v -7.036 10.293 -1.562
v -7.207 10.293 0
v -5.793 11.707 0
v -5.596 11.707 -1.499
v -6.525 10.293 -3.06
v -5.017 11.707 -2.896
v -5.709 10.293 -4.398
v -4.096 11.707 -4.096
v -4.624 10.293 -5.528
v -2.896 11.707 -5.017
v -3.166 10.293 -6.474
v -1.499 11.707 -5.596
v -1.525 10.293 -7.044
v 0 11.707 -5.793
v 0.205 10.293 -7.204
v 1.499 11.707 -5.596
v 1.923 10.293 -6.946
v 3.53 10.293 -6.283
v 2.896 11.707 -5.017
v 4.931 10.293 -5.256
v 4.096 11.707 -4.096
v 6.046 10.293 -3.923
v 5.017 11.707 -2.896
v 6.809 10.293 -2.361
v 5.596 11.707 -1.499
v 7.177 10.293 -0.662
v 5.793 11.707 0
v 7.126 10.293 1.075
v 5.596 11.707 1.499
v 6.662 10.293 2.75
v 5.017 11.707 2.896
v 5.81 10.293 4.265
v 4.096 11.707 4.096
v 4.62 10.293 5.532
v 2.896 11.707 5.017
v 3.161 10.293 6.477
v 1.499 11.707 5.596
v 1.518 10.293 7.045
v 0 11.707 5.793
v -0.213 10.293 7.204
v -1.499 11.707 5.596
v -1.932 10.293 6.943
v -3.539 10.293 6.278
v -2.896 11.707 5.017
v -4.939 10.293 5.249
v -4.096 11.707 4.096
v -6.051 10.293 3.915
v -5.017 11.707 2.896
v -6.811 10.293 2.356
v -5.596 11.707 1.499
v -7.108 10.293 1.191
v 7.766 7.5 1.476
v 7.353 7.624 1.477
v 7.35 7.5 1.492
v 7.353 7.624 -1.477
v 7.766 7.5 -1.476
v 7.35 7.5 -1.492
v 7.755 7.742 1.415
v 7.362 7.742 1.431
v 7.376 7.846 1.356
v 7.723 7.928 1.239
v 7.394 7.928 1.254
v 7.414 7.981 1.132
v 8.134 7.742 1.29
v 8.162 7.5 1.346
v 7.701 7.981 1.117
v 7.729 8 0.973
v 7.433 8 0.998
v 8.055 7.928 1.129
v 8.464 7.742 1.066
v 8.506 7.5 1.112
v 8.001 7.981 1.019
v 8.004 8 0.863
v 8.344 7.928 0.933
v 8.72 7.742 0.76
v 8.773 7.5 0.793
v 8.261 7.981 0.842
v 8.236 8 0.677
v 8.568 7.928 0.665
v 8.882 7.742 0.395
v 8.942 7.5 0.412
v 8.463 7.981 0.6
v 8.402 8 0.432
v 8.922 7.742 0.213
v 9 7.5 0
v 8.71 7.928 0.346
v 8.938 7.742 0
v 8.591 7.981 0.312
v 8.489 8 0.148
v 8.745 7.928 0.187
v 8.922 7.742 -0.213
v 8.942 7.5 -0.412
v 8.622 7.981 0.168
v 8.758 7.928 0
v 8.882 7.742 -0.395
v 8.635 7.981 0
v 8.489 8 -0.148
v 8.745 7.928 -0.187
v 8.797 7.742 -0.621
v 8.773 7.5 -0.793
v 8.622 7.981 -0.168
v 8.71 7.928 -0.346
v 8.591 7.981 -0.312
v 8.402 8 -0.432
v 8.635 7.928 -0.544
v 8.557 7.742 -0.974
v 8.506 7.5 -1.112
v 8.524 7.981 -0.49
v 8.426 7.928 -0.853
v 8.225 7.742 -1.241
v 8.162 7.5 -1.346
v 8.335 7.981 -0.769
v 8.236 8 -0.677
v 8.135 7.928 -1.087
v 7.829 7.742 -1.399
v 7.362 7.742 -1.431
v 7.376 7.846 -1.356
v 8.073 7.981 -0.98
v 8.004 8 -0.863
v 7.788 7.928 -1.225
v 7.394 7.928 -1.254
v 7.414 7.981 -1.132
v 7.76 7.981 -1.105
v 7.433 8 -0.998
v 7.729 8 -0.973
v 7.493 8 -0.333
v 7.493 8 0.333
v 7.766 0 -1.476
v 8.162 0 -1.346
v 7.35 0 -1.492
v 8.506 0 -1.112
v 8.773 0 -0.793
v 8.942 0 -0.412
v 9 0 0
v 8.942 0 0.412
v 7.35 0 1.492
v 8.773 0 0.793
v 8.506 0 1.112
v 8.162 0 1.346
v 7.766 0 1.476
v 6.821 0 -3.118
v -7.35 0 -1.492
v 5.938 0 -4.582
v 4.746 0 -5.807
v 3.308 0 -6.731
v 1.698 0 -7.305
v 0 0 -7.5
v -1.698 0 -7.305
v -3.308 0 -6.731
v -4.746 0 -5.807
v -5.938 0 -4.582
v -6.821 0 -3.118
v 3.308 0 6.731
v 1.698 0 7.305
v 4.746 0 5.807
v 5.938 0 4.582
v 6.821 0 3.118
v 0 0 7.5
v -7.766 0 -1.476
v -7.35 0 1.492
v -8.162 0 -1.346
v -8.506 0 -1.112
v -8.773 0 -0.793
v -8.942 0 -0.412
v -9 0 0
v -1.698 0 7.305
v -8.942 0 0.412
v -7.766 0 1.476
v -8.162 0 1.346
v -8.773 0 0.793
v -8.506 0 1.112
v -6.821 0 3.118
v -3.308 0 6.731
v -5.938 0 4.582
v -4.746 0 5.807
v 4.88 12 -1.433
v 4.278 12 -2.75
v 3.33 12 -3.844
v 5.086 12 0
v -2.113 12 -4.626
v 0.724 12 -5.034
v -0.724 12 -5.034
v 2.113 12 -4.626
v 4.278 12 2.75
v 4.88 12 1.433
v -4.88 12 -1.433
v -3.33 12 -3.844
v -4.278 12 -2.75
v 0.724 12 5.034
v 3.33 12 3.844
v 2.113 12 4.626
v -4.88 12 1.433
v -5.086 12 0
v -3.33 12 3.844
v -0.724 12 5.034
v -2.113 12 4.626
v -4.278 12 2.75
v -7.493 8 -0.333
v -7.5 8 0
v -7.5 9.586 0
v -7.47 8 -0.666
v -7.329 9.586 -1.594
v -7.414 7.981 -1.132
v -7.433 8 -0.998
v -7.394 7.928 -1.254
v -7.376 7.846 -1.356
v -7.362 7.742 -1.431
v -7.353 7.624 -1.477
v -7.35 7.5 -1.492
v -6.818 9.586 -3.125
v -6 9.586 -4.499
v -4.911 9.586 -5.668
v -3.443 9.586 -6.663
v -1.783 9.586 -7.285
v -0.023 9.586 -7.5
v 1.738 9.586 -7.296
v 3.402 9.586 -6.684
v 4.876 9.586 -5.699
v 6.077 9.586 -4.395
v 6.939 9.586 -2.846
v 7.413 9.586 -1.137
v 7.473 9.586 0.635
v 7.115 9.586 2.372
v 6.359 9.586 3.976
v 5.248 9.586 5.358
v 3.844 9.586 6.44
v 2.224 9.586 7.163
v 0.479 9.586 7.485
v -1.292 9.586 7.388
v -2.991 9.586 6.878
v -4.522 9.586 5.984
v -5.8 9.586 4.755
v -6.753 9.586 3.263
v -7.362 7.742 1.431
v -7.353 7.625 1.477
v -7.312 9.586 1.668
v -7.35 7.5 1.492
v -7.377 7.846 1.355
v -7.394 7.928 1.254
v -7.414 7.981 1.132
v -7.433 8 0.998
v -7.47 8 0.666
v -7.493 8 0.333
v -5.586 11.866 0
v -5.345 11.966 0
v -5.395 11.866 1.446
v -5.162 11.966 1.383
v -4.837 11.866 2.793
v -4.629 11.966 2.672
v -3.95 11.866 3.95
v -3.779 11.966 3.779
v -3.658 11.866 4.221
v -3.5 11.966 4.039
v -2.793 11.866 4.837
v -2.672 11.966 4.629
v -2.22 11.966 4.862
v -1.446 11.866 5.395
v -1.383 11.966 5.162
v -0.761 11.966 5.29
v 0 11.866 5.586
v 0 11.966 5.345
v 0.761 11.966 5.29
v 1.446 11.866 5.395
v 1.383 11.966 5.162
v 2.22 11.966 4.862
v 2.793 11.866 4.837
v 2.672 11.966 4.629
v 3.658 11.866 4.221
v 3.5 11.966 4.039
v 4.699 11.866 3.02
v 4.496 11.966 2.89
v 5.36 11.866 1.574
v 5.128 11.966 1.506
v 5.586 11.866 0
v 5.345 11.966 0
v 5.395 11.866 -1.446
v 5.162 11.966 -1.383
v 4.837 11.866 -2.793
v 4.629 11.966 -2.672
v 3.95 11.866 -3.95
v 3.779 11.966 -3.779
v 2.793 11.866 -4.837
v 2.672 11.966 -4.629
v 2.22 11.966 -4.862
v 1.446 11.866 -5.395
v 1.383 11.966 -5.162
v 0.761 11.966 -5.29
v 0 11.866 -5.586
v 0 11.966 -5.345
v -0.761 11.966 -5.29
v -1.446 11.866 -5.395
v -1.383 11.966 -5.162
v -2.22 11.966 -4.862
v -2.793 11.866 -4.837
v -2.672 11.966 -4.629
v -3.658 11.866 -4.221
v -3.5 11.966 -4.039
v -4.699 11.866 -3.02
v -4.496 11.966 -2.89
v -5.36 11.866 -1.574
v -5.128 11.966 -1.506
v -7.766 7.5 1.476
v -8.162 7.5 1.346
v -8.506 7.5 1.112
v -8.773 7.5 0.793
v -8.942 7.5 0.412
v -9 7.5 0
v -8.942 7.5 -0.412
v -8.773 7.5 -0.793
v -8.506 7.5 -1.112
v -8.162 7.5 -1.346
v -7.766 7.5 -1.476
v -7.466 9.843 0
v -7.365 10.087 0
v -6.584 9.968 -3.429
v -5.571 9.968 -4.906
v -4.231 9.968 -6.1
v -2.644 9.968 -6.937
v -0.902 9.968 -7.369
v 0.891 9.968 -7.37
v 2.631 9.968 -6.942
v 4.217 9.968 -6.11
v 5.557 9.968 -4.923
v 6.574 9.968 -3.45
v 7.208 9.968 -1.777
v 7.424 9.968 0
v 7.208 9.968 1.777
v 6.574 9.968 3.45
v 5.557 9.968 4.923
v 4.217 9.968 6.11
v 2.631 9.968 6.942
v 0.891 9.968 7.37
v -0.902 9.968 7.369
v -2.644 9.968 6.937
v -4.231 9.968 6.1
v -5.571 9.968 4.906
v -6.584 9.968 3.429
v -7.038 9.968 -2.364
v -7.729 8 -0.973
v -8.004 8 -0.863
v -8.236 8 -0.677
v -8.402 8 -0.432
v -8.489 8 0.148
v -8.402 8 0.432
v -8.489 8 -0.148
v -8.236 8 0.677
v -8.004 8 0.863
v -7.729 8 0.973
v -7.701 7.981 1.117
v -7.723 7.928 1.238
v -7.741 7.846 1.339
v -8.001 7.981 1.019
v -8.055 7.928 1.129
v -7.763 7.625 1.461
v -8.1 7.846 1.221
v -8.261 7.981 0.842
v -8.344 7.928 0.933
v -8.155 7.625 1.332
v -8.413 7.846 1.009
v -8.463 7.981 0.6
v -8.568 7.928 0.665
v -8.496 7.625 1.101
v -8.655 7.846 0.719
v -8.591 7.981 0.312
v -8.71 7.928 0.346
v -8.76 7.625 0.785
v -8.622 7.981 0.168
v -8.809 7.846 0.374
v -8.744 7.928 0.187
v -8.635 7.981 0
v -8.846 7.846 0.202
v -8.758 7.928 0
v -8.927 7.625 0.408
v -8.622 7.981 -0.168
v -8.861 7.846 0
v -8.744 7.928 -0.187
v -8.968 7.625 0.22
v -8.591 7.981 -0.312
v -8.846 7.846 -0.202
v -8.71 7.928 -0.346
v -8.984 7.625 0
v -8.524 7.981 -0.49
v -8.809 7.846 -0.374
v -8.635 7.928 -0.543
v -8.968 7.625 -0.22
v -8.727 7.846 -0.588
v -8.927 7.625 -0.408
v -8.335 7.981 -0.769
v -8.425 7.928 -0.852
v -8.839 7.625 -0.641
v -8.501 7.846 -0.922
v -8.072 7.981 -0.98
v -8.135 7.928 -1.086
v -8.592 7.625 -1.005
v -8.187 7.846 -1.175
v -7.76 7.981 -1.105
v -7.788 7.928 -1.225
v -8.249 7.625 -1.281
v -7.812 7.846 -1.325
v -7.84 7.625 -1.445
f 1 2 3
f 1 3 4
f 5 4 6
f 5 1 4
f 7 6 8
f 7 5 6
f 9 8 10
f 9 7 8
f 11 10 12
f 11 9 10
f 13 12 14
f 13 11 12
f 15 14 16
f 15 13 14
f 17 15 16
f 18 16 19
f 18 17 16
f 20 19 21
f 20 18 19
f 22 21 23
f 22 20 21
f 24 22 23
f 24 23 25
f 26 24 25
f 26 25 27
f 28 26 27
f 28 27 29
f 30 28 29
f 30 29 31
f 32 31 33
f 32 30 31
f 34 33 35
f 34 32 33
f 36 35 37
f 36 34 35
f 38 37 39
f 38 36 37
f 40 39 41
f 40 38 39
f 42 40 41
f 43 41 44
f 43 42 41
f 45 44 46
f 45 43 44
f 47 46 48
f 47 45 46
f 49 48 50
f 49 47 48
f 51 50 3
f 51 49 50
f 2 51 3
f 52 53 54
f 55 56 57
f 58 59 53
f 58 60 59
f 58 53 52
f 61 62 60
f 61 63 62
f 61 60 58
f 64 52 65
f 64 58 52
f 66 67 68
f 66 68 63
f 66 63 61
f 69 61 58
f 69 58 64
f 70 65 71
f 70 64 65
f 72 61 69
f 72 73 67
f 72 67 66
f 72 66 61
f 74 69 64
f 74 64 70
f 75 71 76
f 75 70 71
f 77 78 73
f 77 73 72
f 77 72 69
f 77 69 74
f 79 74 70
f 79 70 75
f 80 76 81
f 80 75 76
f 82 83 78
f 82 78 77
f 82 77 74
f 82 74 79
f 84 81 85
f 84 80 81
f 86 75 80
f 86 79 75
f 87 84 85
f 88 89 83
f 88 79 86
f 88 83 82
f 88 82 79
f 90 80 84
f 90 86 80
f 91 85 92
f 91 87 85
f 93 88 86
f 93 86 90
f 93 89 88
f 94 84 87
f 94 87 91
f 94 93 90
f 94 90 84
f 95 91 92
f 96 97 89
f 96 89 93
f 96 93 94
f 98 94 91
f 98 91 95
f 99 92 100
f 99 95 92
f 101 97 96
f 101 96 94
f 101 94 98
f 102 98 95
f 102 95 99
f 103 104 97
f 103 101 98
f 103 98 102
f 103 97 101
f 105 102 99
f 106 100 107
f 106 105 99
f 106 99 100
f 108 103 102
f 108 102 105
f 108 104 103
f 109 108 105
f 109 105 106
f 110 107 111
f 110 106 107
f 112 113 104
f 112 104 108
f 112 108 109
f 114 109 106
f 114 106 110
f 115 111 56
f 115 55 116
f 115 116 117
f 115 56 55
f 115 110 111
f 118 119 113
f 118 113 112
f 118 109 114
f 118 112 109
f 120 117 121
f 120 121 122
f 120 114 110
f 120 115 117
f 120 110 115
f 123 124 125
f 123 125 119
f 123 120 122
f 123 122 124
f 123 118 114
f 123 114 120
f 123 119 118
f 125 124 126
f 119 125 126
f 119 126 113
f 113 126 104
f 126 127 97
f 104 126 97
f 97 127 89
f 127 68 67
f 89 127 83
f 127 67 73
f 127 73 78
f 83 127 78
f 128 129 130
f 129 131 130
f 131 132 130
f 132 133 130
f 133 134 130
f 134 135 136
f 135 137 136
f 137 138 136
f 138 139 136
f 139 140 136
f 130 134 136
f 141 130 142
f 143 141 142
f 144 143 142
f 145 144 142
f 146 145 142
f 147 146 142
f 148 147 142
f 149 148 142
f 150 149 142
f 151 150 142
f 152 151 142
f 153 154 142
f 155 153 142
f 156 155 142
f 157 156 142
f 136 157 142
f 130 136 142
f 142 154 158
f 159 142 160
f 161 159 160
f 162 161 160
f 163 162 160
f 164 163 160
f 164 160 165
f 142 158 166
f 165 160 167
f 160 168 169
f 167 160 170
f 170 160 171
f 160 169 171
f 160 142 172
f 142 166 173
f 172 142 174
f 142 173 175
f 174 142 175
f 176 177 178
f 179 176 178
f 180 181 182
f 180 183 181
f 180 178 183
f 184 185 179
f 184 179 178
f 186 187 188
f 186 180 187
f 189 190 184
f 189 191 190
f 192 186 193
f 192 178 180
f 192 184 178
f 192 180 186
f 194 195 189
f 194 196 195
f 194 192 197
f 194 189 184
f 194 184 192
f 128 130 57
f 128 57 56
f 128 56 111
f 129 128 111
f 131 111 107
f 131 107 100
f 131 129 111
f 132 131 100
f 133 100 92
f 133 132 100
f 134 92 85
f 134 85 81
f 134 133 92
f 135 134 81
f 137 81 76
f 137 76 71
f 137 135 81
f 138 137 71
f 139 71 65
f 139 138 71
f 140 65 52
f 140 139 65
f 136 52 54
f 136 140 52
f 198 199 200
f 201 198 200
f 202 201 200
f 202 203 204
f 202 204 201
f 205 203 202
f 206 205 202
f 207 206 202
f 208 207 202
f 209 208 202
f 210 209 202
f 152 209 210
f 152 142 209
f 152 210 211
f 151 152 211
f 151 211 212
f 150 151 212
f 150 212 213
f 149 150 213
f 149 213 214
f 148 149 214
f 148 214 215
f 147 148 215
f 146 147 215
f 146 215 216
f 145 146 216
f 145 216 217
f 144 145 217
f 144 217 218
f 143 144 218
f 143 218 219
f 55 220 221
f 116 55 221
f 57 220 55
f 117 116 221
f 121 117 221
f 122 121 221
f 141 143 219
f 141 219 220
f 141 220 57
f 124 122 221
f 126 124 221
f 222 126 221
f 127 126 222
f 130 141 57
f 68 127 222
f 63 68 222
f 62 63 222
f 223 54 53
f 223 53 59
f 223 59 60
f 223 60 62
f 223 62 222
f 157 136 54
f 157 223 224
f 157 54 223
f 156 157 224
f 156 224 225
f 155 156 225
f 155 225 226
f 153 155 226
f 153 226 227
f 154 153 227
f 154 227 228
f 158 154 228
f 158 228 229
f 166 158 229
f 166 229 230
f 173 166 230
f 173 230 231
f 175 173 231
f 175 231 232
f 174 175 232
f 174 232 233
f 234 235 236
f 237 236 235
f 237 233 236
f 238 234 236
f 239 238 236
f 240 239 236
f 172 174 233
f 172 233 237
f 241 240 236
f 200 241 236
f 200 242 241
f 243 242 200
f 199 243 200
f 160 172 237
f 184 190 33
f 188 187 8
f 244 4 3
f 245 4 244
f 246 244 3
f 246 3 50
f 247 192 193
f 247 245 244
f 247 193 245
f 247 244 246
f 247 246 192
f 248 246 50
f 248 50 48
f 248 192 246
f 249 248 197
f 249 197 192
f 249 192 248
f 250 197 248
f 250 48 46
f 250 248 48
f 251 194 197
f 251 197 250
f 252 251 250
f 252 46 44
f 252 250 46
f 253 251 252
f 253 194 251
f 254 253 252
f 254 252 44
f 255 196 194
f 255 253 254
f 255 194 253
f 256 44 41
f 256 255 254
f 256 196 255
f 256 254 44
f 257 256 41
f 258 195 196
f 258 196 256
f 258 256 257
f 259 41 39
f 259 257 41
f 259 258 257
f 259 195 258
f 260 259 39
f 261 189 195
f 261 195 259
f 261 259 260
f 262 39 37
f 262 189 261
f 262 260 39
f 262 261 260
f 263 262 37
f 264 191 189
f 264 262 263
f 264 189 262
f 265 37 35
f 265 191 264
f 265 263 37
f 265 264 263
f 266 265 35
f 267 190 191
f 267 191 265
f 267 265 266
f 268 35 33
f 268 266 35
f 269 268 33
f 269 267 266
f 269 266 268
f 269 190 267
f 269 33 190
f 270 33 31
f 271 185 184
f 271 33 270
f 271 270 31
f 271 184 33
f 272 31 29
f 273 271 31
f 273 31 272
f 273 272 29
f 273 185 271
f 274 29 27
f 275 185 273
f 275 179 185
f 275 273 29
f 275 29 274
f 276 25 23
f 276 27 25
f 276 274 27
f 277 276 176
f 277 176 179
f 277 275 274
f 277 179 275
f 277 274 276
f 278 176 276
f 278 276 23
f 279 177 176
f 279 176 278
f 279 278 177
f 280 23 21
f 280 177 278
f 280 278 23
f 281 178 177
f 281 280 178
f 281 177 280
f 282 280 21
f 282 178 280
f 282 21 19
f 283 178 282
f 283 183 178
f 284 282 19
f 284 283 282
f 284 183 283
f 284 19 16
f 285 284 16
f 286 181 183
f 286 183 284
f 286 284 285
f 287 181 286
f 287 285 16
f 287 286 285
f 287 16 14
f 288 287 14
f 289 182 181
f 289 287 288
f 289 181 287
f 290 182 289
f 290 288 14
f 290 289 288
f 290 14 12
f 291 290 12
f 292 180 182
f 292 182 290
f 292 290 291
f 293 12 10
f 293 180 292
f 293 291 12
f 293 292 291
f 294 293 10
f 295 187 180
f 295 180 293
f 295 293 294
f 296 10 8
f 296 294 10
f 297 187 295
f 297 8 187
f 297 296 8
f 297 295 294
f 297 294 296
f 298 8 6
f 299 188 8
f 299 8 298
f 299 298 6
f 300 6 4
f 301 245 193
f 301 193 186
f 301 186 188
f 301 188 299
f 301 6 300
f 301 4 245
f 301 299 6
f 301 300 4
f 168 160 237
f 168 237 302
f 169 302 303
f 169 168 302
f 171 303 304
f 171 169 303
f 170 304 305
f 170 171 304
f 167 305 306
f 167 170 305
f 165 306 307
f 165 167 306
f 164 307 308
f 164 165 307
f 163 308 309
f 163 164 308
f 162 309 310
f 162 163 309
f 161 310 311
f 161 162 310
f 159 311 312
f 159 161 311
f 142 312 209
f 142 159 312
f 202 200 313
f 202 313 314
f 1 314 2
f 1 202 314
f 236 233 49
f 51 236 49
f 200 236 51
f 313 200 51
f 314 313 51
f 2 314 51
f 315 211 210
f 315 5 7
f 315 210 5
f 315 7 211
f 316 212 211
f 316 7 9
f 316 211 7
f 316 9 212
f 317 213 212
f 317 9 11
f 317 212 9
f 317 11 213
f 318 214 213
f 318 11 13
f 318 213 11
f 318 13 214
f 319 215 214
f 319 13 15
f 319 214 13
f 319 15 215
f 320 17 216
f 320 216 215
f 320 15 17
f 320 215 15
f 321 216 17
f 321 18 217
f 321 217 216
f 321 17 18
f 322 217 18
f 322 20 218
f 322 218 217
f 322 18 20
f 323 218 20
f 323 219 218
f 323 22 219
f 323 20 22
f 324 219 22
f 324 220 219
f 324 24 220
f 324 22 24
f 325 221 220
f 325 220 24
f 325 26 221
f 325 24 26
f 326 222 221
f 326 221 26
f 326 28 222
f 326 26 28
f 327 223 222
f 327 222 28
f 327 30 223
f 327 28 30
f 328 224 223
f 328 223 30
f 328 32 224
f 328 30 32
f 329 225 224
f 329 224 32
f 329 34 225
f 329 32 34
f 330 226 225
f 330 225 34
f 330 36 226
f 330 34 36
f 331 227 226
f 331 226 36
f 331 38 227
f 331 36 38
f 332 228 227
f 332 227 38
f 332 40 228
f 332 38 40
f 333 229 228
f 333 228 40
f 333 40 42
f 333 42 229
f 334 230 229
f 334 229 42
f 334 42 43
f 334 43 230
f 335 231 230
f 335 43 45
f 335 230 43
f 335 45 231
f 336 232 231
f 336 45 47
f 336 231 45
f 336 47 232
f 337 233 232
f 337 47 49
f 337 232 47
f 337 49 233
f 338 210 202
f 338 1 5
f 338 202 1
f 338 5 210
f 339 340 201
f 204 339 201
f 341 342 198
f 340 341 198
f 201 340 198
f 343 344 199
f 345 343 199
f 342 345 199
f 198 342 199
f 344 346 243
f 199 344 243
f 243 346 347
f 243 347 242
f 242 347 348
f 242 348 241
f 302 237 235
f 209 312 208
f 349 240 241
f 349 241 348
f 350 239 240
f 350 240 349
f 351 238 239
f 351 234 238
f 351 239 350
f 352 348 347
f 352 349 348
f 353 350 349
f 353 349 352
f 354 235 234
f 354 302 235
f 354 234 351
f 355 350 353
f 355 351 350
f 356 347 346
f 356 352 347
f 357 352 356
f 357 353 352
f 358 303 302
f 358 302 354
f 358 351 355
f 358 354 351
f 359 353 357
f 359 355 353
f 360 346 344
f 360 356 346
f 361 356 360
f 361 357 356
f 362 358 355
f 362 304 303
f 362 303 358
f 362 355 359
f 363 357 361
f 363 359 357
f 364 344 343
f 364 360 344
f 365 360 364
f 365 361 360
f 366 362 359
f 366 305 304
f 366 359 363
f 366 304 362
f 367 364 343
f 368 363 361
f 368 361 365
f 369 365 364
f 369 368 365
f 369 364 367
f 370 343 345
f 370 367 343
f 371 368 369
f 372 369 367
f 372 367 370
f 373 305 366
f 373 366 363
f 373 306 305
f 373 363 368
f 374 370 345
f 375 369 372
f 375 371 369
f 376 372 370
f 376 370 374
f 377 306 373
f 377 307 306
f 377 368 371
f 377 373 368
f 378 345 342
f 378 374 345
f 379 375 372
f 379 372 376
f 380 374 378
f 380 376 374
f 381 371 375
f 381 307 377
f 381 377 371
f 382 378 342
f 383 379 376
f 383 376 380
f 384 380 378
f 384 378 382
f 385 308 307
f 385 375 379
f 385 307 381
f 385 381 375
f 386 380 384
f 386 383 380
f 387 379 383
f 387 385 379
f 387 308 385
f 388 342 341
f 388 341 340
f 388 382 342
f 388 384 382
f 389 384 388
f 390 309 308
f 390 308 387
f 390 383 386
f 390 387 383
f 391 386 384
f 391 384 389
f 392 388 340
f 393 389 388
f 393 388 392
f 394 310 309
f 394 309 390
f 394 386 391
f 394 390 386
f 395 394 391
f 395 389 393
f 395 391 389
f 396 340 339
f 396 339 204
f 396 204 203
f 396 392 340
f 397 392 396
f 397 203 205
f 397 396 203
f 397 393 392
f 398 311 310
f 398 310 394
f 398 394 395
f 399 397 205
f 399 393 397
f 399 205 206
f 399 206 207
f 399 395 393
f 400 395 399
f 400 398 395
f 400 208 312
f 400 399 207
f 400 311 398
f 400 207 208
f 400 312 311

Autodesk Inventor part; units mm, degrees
ref_plane "YZ Plane" through (0, 0, 0) normal (1, 0, 0) x (0, 1, 0)
ref_plane "XZ Plane" through (0, 0, 0) normal (0, 1, 0) x (-1, 0, 0)
ref_plane "XY Plane" through (0, 0, 0) normal (0, 0, 1) x (1, 0, 0)
sketch "Skizze1" plane through (0, 0, 0) normal (0, 1, 0) x (-1, 0, 0)
  circle A0 centre (0, 0) radius 7.5
  circle A1 centre (7.5, 0) radius 1.5
  circle A2 centre (-7.5, 0) radius 1.5
  dimension "d0" = 15
  dimension "d1" = 3
  dimension "d2" = 3
extrude "Extrusion1" add sketch "Skizze1" along normal blind 12 contours A0 A1 | A1 A0 A2 | A2 A0 picked at (7.0094, -0.2882) picked at (-6.9889, 0)
sketch "Skizze2" plane through (0, 0, 0) normal (0, -1, 0) x (1, 0, 0)
  circle A0 centre (0, 0) radius 7.5 projected
  circle A1 centre (7.5, 0) radius 1.5
  circle A2 centre (-7.5, 0) radius 1.5
  dimension "d5" = 3
  dimension "d6" = 3
extrude "Extrusion2" add sketch "Skizze2" against normal blind 8 contours A0 A1 | A0 A1 | A2 A0 | A0 A2
chamfer "Fase1" distance 2 angle 45 1 edges at (7.5, 12, 0)
fillet "Rundung1" radius 1 2 edges at (7.5, 10, 0) (5.5, 12, 0)
fillet "Rundung2" radius 0.5 2 edges at (9, 8, 0) (-9, 8, 0)
properties part number "case"
